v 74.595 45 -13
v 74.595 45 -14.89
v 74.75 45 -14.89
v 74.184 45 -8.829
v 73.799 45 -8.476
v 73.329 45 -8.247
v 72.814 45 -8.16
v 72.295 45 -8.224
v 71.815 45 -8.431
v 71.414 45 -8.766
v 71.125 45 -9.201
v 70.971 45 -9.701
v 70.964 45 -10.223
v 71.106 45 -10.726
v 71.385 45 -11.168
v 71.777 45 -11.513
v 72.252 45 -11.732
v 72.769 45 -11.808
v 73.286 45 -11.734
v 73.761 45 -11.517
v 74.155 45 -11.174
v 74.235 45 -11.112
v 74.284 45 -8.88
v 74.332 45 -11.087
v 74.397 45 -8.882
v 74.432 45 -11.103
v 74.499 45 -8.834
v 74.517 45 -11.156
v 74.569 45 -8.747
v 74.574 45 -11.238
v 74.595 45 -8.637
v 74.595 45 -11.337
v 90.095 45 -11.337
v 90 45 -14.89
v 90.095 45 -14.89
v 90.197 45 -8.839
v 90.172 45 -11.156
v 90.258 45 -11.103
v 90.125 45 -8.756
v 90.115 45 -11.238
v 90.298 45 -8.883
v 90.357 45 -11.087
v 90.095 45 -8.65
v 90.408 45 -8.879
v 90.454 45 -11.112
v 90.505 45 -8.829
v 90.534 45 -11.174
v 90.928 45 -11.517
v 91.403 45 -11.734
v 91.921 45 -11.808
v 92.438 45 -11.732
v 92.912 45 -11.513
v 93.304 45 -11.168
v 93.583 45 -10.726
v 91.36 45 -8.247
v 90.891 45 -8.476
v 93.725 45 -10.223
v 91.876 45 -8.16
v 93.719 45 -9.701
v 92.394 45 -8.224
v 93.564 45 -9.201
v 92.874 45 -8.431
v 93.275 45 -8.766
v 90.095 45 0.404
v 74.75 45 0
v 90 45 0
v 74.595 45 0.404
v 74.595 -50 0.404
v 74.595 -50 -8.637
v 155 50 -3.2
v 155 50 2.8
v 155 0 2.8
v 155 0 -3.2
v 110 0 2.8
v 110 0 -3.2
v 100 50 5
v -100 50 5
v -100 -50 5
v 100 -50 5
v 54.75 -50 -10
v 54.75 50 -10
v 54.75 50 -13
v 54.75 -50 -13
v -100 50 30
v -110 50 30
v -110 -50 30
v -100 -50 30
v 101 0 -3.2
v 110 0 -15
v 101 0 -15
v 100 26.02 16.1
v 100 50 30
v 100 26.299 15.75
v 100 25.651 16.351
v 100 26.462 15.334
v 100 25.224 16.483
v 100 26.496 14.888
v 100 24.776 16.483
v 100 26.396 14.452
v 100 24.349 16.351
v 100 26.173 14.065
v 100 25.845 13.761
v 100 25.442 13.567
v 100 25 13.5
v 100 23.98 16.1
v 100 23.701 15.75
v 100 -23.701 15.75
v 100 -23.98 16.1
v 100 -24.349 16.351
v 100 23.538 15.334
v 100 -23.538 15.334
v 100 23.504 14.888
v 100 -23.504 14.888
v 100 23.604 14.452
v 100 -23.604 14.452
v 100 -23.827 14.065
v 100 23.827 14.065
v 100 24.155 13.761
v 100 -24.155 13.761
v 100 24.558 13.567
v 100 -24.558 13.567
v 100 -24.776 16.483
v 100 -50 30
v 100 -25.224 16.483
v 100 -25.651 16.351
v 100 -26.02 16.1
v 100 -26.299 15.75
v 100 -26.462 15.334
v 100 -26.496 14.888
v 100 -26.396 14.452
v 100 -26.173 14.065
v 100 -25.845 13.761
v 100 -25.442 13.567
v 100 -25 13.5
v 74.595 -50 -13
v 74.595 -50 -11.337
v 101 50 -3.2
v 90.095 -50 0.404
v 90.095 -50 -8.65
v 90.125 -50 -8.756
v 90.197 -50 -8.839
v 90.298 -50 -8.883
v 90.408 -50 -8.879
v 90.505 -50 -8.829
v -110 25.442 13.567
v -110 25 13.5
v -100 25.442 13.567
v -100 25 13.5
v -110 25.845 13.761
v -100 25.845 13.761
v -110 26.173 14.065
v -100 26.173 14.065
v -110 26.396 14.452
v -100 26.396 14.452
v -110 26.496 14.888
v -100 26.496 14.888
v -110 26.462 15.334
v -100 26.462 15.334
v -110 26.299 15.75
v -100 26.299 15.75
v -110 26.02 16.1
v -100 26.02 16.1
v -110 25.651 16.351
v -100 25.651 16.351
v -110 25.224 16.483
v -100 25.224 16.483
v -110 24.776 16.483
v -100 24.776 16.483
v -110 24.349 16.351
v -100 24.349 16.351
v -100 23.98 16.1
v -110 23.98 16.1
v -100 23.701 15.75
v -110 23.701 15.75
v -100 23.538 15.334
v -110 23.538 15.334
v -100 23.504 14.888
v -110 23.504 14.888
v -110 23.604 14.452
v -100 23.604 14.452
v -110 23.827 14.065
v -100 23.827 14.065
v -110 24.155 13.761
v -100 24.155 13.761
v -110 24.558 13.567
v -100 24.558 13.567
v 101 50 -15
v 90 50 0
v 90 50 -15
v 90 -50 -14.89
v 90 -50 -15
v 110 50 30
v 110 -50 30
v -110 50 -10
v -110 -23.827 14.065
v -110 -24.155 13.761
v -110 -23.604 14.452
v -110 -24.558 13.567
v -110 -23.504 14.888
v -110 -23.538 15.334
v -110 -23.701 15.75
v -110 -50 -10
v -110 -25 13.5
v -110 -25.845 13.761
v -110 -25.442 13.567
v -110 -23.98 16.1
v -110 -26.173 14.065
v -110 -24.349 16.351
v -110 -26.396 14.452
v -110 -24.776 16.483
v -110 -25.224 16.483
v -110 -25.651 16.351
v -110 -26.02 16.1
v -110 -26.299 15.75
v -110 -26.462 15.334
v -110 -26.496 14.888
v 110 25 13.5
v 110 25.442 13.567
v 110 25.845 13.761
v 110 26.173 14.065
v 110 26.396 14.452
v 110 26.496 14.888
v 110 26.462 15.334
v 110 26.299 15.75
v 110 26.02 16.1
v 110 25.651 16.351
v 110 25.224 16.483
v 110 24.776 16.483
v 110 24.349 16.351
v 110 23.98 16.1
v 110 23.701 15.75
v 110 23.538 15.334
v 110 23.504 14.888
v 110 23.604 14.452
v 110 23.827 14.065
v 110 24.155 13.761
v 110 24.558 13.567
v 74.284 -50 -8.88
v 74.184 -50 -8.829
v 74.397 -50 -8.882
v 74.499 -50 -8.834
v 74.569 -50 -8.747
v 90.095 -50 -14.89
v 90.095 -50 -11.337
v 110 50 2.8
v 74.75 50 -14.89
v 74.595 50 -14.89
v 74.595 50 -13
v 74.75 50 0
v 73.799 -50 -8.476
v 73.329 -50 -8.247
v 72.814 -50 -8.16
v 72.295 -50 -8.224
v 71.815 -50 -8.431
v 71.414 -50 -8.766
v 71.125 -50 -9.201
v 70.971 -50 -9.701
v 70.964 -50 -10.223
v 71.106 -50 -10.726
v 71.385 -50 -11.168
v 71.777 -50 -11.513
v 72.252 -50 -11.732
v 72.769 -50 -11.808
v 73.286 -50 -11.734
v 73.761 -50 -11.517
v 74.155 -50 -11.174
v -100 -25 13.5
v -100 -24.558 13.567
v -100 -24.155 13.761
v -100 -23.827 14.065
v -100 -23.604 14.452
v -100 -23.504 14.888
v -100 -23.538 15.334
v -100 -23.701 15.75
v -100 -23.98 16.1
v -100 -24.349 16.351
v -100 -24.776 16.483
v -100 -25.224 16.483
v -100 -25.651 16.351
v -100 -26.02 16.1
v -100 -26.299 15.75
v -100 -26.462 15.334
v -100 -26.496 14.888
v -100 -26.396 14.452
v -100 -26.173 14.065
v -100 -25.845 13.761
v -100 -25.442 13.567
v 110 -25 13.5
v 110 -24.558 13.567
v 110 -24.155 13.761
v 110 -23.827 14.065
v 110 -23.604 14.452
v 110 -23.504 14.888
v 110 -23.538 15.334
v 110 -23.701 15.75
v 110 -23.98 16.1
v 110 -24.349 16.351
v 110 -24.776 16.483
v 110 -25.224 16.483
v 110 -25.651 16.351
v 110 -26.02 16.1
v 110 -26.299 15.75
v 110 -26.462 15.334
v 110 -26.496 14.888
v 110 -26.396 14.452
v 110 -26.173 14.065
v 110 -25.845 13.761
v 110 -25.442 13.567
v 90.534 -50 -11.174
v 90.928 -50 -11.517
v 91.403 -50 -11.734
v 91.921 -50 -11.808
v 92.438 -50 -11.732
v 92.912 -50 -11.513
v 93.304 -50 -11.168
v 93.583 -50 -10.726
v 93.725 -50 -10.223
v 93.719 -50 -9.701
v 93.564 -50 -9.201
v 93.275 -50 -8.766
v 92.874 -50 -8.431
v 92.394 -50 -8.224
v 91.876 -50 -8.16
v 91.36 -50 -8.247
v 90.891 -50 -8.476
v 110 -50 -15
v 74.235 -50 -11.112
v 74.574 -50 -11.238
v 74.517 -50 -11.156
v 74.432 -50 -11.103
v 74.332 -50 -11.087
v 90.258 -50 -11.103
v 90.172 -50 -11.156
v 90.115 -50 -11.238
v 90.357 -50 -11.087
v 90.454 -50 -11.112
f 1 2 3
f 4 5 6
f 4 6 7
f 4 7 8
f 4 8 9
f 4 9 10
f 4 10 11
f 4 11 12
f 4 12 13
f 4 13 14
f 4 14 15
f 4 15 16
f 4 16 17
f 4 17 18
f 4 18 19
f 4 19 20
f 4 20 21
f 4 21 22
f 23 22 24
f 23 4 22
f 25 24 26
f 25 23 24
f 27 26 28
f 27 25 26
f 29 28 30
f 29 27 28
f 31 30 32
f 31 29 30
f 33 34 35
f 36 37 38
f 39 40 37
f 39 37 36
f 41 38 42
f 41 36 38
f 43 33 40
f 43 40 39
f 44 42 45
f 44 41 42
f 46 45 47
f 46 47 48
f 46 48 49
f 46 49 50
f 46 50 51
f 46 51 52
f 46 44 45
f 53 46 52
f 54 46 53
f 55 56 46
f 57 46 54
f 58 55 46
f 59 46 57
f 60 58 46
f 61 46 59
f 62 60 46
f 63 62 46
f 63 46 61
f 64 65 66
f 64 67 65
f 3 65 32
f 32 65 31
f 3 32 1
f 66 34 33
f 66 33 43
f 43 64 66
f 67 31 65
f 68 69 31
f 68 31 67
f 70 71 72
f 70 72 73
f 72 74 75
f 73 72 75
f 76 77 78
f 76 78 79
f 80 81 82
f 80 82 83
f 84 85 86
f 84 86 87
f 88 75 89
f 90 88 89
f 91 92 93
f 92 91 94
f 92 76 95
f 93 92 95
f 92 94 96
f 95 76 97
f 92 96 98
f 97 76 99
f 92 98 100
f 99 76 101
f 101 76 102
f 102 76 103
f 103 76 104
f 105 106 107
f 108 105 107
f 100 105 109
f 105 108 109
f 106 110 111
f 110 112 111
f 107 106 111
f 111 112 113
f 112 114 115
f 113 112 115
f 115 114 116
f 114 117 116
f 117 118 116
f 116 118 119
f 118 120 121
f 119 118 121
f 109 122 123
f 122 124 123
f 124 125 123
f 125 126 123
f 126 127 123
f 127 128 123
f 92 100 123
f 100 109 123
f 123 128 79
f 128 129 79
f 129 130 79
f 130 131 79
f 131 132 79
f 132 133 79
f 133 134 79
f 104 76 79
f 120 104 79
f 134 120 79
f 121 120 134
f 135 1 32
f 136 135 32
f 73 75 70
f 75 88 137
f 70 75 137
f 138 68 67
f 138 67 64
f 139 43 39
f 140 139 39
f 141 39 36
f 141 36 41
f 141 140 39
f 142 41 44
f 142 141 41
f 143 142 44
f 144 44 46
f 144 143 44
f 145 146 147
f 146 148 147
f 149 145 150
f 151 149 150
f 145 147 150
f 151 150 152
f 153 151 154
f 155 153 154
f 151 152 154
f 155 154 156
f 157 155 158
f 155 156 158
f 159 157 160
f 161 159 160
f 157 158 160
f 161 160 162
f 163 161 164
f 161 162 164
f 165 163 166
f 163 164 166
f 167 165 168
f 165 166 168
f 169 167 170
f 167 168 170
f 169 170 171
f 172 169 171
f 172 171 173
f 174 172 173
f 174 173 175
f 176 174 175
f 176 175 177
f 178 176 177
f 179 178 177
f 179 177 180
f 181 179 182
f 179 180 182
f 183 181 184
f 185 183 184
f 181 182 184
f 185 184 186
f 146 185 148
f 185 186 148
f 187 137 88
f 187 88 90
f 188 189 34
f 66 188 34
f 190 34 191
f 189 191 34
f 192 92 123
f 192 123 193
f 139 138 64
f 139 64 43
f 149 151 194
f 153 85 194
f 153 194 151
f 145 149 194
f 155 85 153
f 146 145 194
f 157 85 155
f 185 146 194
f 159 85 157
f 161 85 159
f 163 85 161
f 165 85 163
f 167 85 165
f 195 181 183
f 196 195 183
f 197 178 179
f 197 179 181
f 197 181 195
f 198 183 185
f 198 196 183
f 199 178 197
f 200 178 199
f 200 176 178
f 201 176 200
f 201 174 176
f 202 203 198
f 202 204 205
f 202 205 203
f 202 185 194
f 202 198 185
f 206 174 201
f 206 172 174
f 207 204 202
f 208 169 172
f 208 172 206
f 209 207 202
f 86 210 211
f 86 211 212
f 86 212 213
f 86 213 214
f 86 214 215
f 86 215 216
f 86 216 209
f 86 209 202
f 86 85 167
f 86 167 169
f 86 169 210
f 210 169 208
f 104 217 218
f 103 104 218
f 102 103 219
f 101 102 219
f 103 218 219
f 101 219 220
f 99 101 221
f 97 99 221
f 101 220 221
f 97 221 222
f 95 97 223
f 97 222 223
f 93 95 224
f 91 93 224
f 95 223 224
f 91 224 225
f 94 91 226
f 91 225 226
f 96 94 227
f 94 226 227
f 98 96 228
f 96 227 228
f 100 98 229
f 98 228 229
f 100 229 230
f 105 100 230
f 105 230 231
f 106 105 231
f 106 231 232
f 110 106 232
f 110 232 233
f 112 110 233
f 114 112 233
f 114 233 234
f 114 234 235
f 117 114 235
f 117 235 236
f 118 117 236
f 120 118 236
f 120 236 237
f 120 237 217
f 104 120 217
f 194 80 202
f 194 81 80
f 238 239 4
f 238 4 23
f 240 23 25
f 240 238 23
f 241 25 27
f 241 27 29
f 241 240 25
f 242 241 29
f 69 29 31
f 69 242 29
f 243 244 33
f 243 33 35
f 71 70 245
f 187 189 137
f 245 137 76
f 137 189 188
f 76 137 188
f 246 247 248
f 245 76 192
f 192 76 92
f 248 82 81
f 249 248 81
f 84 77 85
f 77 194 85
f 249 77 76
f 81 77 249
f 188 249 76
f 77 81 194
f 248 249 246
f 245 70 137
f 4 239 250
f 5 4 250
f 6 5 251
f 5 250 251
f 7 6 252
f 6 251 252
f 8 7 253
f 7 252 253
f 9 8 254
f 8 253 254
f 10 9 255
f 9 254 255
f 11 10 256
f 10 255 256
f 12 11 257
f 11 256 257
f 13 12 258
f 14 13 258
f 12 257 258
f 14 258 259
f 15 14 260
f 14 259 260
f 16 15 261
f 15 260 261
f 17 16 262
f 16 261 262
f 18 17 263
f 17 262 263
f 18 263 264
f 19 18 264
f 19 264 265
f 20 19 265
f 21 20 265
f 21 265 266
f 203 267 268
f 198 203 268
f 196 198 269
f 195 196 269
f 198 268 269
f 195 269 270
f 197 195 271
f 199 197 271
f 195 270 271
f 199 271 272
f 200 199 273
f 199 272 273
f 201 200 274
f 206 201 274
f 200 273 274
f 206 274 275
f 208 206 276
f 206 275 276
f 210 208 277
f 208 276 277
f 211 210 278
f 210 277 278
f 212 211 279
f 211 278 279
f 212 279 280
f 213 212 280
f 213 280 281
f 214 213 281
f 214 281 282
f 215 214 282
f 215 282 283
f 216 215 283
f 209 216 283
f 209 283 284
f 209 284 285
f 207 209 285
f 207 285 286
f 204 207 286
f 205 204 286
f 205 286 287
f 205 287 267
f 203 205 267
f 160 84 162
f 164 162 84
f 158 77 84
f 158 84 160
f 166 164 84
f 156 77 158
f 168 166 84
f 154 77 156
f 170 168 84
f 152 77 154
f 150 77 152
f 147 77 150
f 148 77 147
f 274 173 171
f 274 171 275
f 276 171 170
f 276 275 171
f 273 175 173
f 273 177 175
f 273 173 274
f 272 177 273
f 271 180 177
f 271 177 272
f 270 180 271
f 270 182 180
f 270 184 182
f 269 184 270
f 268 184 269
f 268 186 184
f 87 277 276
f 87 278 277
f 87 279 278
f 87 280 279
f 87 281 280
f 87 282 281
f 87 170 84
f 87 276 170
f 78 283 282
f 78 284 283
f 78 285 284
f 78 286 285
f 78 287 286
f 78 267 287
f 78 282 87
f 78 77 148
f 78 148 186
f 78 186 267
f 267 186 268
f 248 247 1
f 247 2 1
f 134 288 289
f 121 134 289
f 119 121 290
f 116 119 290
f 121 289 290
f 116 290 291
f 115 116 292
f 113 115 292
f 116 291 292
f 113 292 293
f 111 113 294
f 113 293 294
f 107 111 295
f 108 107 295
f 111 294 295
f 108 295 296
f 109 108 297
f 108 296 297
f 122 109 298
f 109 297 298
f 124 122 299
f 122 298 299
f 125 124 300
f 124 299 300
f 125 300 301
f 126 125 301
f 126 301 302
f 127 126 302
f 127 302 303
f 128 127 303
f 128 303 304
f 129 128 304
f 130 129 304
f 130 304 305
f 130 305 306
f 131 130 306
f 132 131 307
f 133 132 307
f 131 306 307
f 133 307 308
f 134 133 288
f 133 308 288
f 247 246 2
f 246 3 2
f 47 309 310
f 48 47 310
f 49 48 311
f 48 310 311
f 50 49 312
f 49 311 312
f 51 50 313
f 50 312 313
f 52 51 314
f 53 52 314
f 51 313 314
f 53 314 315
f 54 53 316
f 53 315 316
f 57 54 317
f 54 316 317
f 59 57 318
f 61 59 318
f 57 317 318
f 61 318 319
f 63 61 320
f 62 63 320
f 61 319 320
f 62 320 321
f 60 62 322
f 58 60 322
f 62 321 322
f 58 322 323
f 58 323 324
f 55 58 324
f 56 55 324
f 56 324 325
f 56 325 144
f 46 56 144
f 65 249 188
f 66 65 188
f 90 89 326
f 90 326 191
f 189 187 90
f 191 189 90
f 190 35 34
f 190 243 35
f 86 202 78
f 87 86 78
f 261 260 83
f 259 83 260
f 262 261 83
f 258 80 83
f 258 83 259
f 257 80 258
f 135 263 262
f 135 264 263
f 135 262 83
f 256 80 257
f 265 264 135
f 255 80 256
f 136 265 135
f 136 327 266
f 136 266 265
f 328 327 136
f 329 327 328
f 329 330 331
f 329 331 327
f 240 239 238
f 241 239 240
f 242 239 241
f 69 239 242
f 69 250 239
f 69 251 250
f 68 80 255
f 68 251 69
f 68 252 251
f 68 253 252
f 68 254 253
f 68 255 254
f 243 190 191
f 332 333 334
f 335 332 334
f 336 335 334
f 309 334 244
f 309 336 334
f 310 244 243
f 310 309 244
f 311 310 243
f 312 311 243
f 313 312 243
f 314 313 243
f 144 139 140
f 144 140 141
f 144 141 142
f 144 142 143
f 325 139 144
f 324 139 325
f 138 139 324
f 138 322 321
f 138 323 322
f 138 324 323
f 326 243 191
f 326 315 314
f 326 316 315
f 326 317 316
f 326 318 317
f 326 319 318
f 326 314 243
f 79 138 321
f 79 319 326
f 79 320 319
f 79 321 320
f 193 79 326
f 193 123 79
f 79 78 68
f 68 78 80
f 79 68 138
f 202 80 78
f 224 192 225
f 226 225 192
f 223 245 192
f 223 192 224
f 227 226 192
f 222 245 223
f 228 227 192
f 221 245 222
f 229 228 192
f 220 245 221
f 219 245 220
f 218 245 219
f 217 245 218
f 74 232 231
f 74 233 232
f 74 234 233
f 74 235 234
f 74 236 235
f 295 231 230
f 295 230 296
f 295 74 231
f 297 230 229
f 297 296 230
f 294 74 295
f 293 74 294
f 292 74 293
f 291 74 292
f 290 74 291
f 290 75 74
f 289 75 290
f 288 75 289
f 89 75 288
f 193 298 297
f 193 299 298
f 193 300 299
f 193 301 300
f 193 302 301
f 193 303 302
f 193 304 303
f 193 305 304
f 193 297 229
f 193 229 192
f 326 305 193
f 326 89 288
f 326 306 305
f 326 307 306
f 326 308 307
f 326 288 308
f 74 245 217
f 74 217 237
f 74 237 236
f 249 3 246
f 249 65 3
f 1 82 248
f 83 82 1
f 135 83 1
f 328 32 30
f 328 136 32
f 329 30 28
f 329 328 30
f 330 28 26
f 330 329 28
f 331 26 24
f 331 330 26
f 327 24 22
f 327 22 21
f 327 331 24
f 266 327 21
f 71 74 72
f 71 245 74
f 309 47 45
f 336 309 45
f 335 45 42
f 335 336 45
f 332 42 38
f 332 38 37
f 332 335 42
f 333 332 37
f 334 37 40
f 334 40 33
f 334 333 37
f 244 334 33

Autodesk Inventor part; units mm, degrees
sketch "Sketch1" plane through (0, 0, 0) normal (0, 0, 1) x (1, 0, 0)
  line L0 (-110, 50) -> (110, 50)
  line L1 (110, 50) -> (110, -50)
  line L2 (110, -50) -> (-110, -50)
  line L3 (-110, -50) -> (-110, 50)
  line L4 (-110, 50) -> (110, -50) construction
  line L5 (110, 50) -> (-110, -50) construction
  line L6 (110, 50) -> (100, 50)
  line L7 (100, 50) -> (100, -50)
  line L8 (100, -50) -> (110, -50)
  line L9 (110, -50) -> (110, 50)
  line L10 (-110, 50) -> (-100, 50)
  line L11 (-100, 50) -> (-100, -50)
  line L12 (-100, -50) -> (-110, -50)
  line L13 (-110, -50) -> (-110, 50)
  point P0 (0, 0)
  dimension "d0" = 220
  dimension "d1" = 100
  dimension "d2" = 10
  dimension "d3" = 10
extrude "Extrusion1" add sketch "Sketch1" along normal blind 5 contours L0 L7 L2 L11
extrude "Extrusion2" add sketch "Sketch1" along normal blind 30 contours L0 L11 L2 L3 | L0 L1 L2 L7
sketch "Sketch2" plane through (110, -50, 0) normal (1, 0, 0) x (0, 0, -1)
  circle A0 centre (-15, 75) radius 1.5
  circle A1 centre (-15, 25) radius 1.5
  line L0 (0, 100) -> (-30, 100) projected
  line L1 (0, 0) -> (-30, 0) projected
  point P0 (0, 50)
  point P1 (-15, 100)
  point P2 (-15, 0)
  dimension "d8" = 3
  dimension "d9" = 3
  dimension "d10" = 25
  dimension "d11" = 25
extrude "Extrusion3" cut sketch "Sketch2" against normal blind 300
ref_plane "Work Plane1" through (0, 0, 2.5) normal (0, 0, -1) x (-1, 0, 0)
sketch "Sketch5" plane through (-100, -50, 5) normal (0, -1, 0) x (1, 0, 0)
  point P0 (100, -5)
sketch "Sketch6" plane through (0, 0, 0) normal (0, 0, -1) x (-1, 0, 0)
  line L0 (-110, 50) -> (110, 50) projected
  line L1 (-90, 50) -> (-75, 50)
  point P0 (0, 0)
sketch "Sketch7" plane through (-100, -50, 5) normal (0, -1, 0) x (1, 0, 0)
  point P0 (100, -5)
sketch "Sketch10" plane through (0, 0, 0) normal (0, 0, -1) x (-1, 0, 0)
  point P0 (0, 0)
sketch "Sketch11" plane through (-100, -50, 5) normal (0, -1, 0) x (1, 0, 0)
  point P0 (100, -5)
sketch "Sketch12" plane through (-100, -50, 5) normal (0, -1, 0) x (1, 0, 0)
  point P0 (100, -5)
sketch "Sketch13" plane through (-100, -50, 5) normal (0, -1, 0) x (1, 0, 0)
  point P0 (100, -5)
sketch "Sketch14" plane through (-100, -50, 5) normal (0, -1, 0) x (1, 0, 0)
  point P0 (100, -5)
ref_plane "Work Plane3" through (-100, -40, 5) normal (0, -1, 0) x (1, 0, 0)
sketch "Sketch16" plane through (0, 0, 0) normal (0, 0, -1) x (-1, 0, 0)
  point P0 (0, 0)
sketch "Sketch18" plane through (-100, -50, 5) normal (0, -1, 0) x (1, 0, 0)
  point P0 (100, -5)
sketch "Sketch20" plane through (0, 0, 0) normal (0, 0, -1) x (-1, 0, 0)
  line L0 (-110, 50) -> (110, 50) projected
  line L1 (100, -50) -> (-100, -50) projected
  line L2 (-110, 50) -> (-90, 50)
  line L3 (-90, 50) -> (-90, -50)
  line L4 (-90, -50) -> (-110, -50)
  line L5 (-110, -50) -> (-110, 50)
  line L6 (-100, 50) -> (100, 50) projected
  line L7 (-74.75, 50) -> (-54.75, 50)
  line L8 (-54.75, 50) -> (-54.75, -50)
  line L9 (-54.75, -50) -> (-74.75, -50)
  line L10 (-74.75, -50) -> (-74.75, 50)
  point P0 (0, 0)
  point P1 (-74.75, 50)
  point P2 (-74.75, -50)
  dimension "d46" = 20
  dimension "d47" = 20
  dimension "d48" = 15.25
extrude "Extrusion10" add sketch "Sketch20" along normal blind 15 contours L0 L3 L1 L4 L5 | L0 L8 L1 L10
ref_plane "Work Plane5" through (-100, -50, 5) normal (0, -1, 0) x (1, 0, 0)
sketch "Sketch22" plane through (-100, -50, 5) normal (0, -1, 0) x (1, 0, 0)
  line L0 (174.75, -5) -> (190, -5) projected
  line L1 (182.375, -5) -> (182.375, -19.781)
  arc A0 (174.1976, -13.8453) -> (174.1552, -16.1739) centre (172.7726, -14.984) ccw
  arc A1 (174.184, -13.8286) -> (174.1552, -16.1739) centre (172.7726, -14.984) ccw
  arc A2 (174.184, -13.8286) -> (174.5946, -13.637) centre (174.3446, -13.637) ccw
  line L2 (174.5946, -13.637) -> (174.5946, -4.5959)
  line L3 (174.5946, -4.5959) -> (190.095, -4.5959)
  line L4 (190.095, -4.5959) -> (190.095, -13.6504)
  arc A3 (190.095, -13.6504) -> (190.5052, -13.8286) centre (190.3446, -13.637) ccw
  arc A4 (190.5341, -16.1739) -> (190.5052, -13.8286) centre (191.9167, -14.984) ccw
  arc A5 (190.5341, -16.1739) -> (190.0946, -16.337) centre (190.3446, -16.337) ccw
  line L5 (190.0946, -16.337) -> (190.0946, -19.8904)
  line L6 (190.0946, -19.8904) -> (174.5946, -19.8904)
  line L7 (174.5946, -19.8904) -> (174.5946, -16.337)
  arc A6 (174.5946, -16.337) -> (174.1552, -16.1739) centre (174.3446, -16.337) ccw
  line L8 (174.75, -5) -> (174.75, -20) projected
  circle A7 centre (182.375, -12.3905) radius 0.9755 construction
  line L9 (190, -5) -> (190, -20) projected
  line L10 (154.75, -5) -> (154.75, -20) projected
  line L11 (174.75, -20) -> (154.75, -20)
  line L12 (154.75, -20) -> (154.75, -18)
  line L13 (154.75, -18) -> (174.75, -18)
  line L14 (174.75, -18) -> (174.75, -20)
  point P0 (100, -5)
  point P1 (182.7765, -10.9918)
  point P2 (174.184, -13.8286)
  point P3 (174.75, -19.8904)
  point P4 (190, -19.8904)
  point P5 (174.5946, -18)
  dimension "d74" = 2
extrude "Extrusion13" cut sketch "Sketch22" against normal blind 95 contours L8 L13 L7 A6 A0 A2 L2 L3 L4 A3 A4 A5 L5 L6 L9 L0 | L8 L6 L7 L13
sketch "Sketch23" plane through (0, 0, 0) normal (0, 0, -1) x (-1, 0, 0)
  line L0 (110, -50) -> (-54.75, -50) projected
  line L1 (-54.75, 50) -> (-54.75, -50) projected
  line L2 (110, -50) -> (-54.75, -50)
  line L3 (-54.75, -50) -> (-54.75, 50)
  line L4 (-54.75, 50) -> (110, 50)
  line L5 (110, 50) -> (110, -50)
  point P0 (0, 0)
extrude "Extrusion14" add sketch "Sketch23" along normal blind 10
extrude "Extrusion15" cut sketch "Sketch22" against normal blind 100 contours L8 L11 L10 L13 L7 L6
sketch "Sketch24" plane through (110, -50, 30) normal (1, 0, 0) x (0, 0, -1)
  line L0 (45, 100) -> (0, 100) projected
  line L1 (45, 100) -> (33.2, 100)
  line L2 (33.2, 100) -> (33.2, 50)
  line L3 (33.2, 50) -> (45, 50)
  line L4 (45, 50) -> (45, 100)
  point P0 (30, 50)
  dimension "d77" = 11.8
extrude "Extrusion16" cut sketch "Sketch24" against normal blind 9
sketch "Sketch25" plane through (110, -50, 30) normal (1, 0, 0) x (0, 0, -1)
  line L0 (40, 100) -> (0, 100) projected
  line L1 (33.2, 100) -> (23.2, 100)
  line L2 (23.2, 100) -> (23.2, 50)
  line L3 (23.2, 50) -> (33.2, 50)
  line L4 (33.2, 50) -> (33.2, 100)
  line L5 (33.2, 50) -> (33.2, 100) projected
  point P0 (30, 50)
  dimension "d80" = 10
extrude "Extrusion17" add sketch "Sketch25" along normal blind 45
sketch "Sketch26" plane through (110, 0, 6.8) normal (0, 0, 1) x (1, 0, 0)
  line L0 (0, 0) -> (0, 50) projected
  line L1 (0, 0) -> (45, 0) projected
  line L2 (45, 50) -> (45, 0) projected
  line L3 (0, 50) -> (45, 50) projected
  point P0 (-110, 0)
extrude "Extrusion18" cut sketch "Sketch26" against normal blind 4
properties part number "offloadbase"
